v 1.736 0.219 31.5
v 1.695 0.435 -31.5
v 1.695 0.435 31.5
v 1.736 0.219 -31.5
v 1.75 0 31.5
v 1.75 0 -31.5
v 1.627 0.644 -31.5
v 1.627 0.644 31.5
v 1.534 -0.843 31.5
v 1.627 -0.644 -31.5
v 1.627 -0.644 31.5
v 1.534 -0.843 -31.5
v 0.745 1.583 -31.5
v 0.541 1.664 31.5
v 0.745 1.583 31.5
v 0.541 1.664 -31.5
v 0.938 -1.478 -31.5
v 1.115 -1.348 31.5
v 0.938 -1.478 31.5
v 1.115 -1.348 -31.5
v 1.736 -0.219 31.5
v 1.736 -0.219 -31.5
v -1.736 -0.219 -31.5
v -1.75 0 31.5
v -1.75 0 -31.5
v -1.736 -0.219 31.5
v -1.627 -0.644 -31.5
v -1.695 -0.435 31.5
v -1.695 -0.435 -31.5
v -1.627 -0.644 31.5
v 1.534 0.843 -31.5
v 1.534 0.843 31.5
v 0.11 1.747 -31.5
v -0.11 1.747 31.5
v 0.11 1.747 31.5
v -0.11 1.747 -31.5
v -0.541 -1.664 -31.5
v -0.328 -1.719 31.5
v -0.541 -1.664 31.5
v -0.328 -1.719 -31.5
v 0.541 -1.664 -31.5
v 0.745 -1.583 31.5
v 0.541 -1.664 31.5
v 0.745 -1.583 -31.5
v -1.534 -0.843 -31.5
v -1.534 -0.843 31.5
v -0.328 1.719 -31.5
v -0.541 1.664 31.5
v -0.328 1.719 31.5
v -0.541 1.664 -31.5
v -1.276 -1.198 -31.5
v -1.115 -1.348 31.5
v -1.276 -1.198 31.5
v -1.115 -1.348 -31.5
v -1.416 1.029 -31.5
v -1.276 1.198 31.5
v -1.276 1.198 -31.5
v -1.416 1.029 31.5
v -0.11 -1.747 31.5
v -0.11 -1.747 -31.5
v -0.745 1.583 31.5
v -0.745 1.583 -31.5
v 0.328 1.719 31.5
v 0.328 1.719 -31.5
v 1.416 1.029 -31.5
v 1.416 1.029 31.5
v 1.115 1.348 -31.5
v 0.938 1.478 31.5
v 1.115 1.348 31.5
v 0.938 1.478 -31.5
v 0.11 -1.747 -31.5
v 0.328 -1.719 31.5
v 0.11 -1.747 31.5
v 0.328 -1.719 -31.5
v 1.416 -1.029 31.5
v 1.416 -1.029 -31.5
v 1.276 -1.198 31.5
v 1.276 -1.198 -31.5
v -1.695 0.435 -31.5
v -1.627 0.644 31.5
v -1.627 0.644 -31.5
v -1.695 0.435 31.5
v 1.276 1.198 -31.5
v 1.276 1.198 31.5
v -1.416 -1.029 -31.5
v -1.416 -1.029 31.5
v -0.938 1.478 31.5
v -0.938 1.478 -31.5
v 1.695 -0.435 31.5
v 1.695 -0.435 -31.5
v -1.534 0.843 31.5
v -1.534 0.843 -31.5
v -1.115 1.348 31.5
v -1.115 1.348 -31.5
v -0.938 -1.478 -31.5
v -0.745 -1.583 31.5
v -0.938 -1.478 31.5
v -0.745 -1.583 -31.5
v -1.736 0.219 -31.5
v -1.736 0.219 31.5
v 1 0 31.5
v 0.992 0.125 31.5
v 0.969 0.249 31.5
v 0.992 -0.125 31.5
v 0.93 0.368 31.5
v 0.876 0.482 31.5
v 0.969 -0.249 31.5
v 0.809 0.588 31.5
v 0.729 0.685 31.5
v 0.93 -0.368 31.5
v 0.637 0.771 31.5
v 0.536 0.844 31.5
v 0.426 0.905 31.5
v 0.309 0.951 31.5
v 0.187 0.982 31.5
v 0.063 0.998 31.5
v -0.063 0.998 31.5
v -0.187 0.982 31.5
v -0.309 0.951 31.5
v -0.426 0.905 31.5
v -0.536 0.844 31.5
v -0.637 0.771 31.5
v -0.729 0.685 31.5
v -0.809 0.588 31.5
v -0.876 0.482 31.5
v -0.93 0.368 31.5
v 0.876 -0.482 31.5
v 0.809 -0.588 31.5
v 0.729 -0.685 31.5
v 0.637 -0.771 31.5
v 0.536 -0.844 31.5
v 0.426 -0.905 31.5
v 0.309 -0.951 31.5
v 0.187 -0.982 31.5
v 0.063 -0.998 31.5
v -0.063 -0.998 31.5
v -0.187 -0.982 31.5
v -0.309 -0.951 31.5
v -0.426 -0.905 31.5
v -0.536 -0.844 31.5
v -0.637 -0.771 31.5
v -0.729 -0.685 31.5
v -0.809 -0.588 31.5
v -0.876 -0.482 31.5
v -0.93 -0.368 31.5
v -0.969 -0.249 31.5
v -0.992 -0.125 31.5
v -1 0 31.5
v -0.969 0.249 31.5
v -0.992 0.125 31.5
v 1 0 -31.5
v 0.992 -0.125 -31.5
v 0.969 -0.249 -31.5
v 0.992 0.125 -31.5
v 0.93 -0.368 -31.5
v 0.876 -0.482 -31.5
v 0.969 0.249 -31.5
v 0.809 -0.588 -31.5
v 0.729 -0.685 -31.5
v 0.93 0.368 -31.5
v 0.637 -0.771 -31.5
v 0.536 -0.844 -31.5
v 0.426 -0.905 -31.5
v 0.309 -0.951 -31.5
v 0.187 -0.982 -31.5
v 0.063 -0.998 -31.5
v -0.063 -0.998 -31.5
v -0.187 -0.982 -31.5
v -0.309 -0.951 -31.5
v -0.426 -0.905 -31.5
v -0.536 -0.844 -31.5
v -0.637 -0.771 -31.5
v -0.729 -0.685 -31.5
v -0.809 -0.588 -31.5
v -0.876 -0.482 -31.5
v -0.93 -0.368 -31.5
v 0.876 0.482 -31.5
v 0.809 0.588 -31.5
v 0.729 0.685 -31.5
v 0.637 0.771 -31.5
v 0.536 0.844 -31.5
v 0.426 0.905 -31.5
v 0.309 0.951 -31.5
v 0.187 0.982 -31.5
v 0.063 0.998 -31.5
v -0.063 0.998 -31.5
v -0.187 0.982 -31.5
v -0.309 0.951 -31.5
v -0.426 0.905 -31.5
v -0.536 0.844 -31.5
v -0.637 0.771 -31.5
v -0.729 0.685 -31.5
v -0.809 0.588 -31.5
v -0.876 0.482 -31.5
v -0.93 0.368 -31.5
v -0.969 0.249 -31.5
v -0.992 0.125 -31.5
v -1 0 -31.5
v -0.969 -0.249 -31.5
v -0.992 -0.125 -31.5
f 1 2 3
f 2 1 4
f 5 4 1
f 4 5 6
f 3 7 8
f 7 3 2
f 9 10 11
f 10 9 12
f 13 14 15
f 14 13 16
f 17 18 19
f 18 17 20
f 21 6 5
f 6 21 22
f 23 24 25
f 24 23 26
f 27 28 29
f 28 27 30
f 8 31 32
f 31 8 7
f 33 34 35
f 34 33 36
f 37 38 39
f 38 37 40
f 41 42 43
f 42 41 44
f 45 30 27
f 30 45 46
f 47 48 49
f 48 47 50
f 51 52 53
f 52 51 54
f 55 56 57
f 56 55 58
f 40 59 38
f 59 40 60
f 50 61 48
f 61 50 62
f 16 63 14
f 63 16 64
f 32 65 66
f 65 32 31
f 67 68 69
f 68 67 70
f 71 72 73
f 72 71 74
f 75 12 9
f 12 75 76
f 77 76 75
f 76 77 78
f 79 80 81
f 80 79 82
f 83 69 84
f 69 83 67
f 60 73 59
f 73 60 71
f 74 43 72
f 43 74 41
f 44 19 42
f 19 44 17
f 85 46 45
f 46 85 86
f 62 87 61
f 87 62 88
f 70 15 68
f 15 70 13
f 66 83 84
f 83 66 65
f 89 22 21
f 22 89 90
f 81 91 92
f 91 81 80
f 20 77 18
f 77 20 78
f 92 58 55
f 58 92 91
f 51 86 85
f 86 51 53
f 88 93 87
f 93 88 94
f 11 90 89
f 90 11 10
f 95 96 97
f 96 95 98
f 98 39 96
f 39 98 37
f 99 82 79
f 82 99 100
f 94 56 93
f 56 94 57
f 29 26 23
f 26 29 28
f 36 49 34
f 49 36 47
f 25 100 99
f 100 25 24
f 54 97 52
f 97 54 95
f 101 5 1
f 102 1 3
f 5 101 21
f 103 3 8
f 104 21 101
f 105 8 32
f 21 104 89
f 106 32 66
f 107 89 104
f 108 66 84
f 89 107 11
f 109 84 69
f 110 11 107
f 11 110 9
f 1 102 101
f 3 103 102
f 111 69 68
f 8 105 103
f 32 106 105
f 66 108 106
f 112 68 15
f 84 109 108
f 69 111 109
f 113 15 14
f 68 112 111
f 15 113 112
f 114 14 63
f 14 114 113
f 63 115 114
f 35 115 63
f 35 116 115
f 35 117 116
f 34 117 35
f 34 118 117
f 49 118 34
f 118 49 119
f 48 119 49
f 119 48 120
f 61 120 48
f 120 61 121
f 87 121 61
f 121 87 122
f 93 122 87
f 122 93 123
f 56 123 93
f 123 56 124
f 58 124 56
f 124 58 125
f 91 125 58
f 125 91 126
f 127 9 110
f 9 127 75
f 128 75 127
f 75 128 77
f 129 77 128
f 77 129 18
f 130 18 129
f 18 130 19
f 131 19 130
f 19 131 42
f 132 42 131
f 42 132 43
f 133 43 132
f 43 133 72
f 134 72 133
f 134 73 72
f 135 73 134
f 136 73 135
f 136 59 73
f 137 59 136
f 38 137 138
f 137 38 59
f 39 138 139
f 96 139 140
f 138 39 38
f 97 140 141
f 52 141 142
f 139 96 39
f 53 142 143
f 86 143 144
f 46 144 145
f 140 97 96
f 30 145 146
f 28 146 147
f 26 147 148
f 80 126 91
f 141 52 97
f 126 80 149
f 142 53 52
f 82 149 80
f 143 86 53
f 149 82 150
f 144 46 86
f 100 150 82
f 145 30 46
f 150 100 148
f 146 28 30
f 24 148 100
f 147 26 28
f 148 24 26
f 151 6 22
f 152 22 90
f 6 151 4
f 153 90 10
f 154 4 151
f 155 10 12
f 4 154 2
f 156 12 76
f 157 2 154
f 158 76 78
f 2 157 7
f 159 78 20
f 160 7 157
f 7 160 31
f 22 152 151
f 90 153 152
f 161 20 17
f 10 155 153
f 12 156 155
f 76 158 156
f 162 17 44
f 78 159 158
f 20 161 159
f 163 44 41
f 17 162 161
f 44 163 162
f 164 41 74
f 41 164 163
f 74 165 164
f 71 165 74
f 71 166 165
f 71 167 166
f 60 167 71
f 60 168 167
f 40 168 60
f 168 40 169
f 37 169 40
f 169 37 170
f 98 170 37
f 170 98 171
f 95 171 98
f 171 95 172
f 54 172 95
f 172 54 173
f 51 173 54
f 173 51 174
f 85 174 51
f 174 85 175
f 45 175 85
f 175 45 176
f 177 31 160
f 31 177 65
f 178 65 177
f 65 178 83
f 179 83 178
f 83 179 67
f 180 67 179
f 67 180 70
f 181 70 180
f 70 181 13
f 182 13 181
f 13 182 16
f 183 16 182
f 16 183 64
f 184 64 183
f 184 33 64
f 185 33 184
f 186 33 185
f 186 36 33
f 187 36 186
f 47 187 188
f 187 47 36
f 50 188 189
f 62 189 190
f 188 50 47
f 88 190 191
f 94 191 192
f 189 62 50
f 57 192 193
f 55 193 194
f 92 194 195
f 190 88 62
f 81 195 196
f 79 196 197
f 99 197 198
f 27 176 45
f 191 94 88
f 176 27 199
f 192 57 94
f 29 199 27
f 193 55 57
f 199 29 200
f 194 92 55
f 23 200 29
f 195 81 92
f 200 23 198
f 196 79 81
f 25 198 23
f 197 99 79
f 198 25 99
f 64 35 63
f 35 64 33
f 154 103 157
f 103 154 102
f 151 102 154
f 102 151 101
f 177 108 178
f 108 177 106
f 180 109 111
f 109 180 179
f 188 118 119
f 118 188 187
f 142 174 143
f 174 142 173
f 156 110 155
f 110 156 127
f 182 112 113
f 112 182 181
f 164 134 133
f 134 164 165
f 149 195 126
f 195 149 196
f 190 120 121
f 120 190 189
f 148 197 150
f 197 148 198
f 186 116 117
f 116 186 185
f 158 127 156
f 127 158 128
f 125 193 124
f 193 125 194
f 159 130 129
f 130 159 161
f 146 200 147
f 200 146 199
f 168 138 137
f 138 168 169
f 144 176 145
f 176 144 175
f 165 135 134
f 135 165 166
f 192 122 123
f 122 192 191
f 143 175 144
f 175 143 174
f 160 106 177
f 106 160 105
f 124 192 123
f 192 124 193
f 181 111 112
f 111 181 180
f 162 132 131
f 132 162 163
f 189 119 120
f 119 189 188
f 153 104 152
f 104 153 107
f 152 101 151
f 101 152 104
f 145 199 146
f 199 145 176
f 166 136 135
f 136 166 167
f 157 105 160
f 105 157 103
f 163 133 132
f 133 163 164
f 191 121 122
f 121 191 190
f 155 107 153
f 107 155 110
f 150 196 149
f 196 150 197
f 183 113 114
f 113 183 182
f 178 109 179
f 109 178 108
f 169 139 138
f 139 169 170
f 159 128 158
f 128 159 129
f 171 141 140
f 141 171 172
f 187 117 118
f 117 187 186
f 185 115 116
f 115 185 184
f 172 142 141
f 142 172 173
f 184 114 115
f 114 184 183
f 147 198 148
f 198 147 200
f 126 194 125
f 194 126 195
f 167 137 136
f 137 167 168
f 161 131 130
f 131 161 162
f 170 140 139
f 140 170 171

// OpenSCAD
$fn = 50;


difference() {
	union() {
		translate(v = [0, 0, -31.5000000000]) {
			cylinder(h = 63, r = 1.7500000000);
		}
	}
	union() {
		translate(v = [0, 0, -100.0000000000]) {
			cylinder(h = 200, r = 1.0000000000);
		}
	}
}
